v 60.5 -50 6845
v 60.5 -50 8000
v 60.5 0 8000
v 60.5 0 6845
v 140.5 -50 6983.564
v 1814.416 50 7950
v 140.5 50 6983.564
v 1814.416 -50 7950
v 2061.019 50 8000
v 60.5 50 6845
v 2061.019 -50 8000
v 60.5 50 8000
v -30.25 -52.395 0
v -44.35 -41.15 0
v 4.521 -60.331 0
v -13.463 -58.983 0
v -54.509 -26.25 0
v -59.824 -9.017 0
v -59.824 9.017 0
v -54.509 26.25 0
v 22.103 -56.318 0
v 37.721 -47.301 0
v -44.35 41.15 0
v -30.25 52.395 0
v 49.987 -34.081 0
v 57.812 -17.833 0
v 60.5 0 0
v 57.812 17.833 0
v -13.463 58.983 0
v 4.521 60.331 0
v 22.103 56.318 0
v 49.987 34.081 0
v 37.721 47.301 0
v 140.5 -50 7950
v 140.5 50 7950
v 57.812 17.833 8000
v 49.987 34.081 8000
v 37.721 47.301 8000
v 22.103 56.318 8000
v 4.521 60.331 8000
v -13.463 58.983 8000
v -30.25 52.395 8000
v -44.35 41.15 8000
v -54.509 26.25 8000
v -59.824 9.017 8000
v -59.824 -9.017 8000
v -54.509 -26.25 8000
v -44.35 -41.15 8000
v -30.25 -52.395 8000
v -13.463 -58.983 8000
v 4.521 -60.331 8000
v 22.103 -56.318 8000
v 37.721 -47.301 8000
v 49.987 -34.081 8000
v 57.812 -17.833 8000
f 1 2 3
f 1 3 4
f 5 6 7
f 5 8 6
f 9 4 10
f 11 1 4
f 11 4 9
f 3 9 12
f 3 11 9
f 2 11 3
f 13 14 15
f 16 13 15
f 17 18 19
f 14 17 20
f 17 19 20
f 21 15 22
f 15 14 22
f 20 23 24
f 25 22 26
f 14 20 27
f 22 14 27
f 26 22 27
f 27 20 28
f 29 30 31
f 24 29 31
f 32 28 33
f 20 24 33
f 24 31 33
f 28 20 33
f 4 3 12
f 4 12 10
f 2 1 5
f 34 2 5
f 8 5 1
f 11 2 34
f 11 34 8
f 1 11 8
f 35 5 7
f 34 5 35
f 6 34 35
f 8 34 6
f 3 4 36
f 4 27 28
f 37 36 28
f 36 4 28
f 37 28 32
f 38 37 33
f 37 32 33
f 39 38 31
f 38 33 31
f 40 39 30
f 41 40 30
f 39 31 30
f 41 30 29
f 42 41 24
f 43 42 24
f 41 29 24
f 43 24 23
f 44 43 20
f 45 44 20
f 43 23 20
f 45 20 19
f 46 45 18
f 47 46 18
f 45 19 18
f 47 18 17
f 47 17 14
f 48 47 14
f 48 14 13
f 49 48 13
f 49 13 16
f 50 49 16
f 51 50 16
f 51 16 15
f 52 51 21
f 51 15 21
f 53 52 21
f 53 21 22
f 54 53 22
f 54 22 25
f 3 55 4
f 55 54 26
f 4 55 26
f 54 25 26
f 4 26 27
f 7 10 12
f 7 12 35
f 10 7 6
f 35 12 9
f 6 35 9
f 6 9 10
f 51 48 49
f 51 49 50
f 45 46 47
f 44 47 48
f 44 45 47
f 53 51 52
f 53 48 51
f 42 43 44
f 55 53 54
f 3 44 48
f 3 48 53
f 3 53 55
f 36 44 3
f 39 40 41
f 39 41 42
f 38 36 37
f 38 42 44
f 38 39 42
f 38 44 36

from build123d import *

# Parameters (mm, degrees)
F0_R     = 60.5
F1_DEPTH = 8000
F3_DEPTH = 50


with BuildPart() as f1:
    # F0 (on Top) → F1 (new body)
    with BuildSketch(Plane.XY):
        Circle(F0_R)
    extrude(amount=F1_DEPTH)

    # F2 (on Front) → F3 (join, symmetric)
    with BuildSketch(Plane.XZ):
        Polygon((2061.018683, 8000), (60.5, 8000), (60.5, 6845), align=None)
        Polygon((140.5, 6983.564065), (140.5, 7950), (1814.416142, 7950), align=None, mode=Mode.SUBTRACT)
    extrude(amount=F3_DEPTH, both=True)


solid = f1.part
